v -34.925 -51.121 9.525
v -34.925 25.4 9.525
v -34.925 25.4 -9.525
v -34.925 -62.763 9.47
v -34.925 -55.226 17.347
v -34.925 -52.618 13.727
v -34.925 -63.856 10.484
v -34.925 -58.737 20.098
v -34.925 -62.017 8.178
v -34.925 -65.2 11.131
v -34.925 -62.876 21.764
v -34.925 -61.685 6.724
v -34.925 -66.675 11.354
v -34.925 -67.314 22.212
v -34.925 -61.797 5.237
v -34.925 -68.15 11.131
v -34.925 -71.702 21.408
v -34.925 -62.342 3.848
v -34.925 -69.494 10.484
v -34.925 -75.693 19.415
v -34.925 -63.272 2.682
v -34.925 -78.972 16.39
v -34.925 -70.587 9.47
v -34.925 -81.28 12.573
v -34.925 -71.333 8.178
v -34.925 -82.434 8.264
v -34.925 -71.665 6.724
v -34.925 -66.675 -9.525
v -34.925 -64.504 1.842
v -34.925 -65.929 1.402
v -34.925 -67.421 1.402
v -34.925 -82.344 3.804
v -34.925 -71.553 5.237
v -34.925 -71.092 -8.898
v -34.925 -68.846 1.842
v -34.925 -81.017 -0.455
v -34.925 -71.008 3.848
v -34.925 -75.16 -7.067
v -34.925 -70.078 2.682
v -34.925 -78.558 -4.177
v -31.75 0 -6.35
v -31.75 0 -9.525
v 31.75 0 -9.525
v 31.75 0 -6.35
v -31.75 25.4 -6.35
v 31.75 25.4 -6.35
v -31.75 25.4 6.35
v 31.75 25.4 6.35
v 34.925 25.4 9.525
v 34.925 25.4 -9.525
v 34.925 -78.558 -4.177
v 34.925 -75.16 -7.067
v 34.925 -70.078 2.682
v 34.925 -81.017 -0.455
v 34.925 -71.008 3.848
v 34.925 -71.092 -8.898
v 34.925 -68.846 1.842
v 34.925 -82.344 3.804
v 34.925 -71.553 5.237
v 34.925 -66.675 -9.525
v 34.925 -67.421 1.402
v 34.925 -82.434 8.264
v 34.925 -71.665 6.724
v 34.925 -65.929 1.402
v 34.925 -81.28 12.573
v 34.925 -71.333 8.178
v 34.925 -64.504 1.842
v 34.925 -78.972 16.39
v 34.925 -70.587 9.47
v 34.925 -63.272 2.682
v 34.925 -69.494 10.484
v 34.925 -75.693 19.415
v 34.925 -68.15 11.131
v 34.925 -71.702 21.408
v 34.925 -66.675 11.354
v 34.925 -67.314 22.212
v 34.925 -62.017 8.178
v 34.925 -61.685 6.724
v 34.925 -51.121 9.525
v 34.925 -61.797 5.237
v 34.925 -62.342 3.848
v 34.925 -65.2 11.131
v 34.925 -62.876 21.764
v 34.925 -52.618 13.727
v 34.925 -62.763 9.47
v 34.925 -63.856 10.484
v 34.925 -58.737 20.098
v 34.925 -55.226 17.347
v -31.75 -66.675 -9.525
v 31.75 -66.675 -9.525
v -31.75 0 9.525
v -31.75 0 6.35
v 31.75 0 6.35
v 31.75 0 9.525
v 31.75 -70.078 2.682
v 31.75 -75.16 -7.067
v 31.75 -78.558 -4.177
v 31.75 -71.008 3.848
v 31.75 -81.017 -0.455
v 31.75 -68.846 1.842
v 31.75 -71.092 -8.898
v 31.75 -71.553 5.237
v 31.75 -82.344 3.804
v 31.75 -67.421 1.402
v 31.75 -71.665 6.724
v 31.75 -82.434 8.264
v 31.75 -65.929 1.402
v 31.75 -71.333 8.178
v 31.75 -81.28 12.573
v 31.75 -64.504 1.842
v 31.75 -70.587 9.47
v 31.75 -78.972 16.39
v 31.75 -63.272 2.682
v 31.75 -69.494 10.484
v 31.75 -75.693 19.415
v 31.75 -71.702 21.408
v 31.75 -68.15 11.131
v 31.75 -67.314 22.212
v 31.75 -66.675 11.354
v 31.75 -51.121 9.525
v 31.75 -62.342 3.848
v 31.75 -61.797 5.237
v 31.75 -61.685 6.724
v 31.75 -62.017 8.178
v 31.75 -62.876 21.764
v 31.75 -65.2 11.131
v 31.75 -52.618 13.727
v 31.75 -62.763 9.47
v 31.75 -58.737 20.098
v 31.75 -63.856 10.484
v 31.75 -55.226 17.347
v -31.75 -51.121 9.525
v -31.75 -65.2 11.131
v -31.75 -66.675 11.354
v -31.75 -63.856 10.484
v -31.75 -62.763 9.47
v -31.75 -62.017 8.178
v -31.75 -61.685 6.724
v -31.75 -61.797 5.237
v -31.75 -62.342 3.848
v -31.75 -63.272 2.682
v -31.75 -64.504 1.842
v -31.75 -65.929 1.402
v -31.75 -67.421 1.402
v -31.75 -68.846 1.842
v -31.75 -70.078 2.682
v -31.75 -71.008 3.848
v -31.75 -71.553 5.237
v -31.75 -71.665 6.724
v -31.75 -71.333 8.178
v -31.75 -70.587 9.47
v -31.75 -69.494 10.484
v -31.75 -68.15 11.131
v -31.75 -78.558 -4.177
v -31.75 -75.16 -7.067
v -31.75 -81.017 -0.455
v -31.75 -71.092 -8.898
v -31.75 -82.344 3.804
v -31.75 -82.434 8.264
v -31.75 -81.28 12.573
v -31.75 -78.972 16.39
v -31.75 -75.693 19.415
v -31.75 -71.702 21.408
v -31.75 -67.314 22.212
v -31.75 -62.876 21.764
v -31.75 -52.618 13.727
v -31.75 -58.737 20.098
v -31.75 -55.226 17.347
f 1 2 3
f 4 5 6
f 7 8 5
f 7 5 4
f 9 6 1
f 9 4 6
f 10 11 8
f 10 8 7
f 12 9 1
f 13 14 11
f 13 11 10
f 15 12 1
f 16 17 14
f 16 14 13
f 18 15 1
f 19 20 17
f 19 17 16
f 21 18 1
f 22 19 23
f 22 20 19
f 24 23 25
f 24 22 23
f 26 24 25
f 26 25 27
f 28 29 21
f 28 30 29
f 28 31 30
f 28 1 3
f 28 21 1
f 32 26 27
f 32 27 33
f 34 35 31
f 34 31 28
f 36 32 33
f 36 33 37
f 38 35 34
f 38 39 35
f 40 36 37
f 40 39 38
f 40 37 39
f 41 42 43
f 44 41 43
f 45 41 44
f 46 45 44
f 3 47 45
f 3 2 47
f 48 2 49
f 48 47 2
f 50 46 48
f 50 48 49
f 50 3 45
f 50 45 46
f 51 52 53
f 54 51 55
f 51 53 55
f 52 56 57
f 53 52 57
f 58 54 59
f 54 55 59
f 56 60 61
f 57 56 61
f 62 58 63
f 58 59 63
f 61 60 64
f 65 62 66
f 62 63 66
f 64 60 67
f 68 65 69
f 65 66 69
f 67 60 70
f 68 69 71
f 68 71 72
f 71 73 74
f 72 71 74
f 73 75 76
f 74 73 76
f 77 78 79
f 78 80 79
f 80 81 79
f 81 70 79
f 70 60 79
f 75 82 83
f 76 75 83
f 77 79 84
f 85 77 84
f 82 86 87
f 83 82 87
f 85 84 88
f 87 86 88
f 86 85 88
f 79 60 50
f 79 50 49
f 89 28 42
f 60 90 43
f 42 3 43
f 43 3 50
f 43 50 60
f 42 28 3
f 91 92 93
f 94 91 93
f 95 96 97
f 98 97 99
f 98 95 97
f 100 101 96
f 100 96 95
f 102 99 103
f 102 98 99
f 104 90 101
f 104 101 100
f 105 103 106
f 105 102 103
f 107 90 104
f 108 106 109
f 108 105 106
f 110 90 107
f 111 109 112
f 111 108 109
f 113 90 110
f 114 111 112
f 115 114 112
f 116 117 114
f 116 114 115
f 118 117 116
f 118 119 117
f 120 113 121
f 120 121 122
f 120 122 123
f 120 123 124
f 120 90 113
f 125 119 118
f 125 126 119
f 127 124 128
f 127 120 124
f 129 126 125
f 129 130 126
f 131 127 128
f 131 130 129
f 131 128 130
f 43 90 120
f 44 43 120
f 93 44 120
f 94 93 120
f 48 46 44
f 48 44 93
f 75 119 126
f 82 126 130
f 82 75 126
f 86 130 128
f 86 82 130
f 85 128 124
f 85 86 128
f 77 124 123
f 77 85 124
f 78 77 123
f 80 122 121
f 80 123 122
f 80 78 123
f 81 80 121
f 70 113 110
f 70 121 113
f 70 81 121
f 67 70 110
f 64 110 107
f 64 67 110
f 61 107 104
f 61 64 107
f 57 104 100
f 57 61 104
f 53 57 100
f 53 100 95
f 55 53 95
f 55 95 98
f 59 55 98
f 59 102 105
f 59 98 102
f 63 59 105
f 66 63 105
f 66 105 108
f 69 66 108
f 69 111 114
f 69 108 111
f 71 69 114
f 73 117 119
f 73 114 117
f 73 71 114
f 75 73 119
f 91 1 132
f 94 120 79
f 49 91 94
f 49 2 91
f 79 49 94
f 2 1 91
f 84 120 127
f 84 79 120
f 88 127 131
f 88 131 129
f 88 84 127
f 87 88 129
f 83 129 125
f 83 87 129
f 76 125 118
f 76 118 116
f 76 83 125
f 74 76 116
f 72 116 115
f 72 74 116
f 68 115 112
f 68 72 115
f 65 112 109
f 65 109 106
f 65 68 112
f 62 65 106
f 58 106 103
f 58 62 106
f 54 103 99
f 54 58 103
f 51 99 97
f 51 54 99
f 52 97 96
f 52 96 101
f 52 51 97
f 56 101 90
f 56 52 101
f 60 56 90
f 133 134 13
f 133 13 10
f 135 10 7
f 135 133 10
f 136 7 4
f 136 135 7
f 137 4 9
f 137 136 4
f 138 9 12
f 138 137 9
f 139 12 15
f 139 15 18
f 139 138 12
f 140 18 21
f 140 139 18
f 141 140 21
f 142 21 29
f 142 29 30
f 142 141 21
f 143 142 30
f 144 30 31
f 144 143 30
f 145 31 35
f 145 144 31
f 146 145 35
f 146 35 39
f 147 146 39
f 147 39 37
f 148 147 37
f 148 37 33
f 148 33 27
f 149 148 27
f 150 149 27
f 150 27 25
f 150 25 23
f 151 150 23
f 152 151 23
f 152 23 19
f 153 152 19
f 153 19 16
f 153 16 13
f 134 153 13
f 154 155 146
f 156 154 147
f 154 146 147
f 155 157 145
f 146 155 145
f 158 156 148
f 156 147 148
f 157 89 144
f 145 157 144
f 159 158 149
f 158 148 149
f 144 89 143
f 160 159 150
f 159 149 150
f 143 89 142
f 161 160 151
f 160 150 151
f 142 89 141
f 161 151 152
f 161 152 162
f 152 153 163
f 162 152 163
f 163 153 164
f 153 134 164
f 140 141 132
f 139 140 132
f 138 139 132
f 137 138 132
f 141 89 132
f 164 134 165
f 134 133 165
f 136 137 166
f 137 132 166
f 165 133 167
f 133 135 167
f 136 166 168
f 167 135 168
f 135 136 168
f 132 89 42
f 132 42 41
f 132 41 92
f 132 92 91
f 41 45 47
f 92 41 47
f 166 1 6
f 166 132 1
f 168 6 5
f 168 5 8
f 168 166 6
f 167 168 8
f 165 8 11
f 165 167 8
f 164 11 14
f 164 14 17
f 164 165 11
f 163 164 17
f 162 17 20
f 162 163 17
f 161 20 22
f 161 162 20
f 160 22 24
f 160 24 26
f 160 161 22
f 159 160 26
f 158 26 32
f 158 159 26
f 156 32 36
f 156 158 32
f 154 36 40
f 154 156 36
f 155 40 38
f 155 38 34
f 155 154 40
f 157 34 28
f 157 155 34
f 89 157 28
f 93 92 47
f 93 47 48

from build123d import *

# Parameters (mm, degrees)
PROBEPROFILE_W      = 69.85
PROBEPROFILE_H      = 19.05
PROBEPROFILE_W_2    = 63.5
PROBEPROFILE_H_2    = 12.7
EXTRUDE_THIN1_DEPTH = 25.4
SKETCH2_R           = 15.875
BOSS_EXTRUDE1_DEPTH = 34.925
SKETCH2_2_R         = 15.875
CUT_EXTRUDE1_DEPTH  = 31.75
SKETCH3_W           = 3.175
SKETCH3_H           = 19.05
BOSS_EXTRUDE2_DEPTH = 66.675
CUT_EXTRUDE2_START  = -69.85
SKETCH4_R           = 5.0038
CUT_EXTRUDE2_DEPTH  = 69.85


with BuildPart() as part:
    # ProbeProfile → Extrude-Thin1 (new body)
    with BuildSketch(Plane(origin=(0, 0, 0), x_dir=(1, 0, 0), z_dir=(0, 1, 0))):
        Rectangle(PROBEPROFILE_W, PROBEPROFILE_H)
        Rectangle(PROBEPROFILE_W_2, PROBEPROFILE_H_2, mode=Mode.SUBTRACT)
    extrude(amount=EXTRUDE_THIN1_DEPTH)



with BuildPart() as body_2:
    # Sketch2 → Boss-Extrude1 (new body, symmetric)
    with BuildSketch(Plane(origin=(0, 0, 0), x_dir=(0, 0, -1), z_dir=(1, 0, 0))):
        with Locations((-6.35, -66.675)):
            Circle(SKETCH2_R)
    extrude(amount=BOSS_EXTRUDE1_DEPTH, both=True)

    # Sketch2<2> → Cut-Extrude1 (cut, symmetric)
    with BuildSketch(Plane(origin=(0, 0, 0), x_dir=(0, 0, -1), z_dir=(1, 0, 0))):
        with Locations((-6.35, -66.675)):
            Circle(SKETCH2_2_R)
    extrude(amount=CUT_EXTRUDE1_DEPTH, both=True, mode=Mode.SUBTRACT)


with BuildPart() as part_1:
    add(part.part)

    add(body_2.part)  # Boss-Extrude2 merges body 2
    # Sketch3 → Boss-Extrude2 (add)
    with BuildSketch(Plane.XZ):
        with Locations((33.3375, 0)):
            Rectangle(SKETCH3_W, SKETCH3_H)
        with Locations((-33.3375, 0)):
            Rectangle(SKETCH3_W, SKETCH3_H)
    extrude(amount=BOSS_EXTRUDE2_DEPTH)

    # Sketch4 → Cut-Extrude2 (cut)
    with BuildSketch(Plane.ZY.offset(34.925).offset(CUT_EXTRUDE2_START)):
        with Locations((6.35, -66.675)):
            Circle(SKETCH4_R)
    extrude(amount=CUT_EXTRUDE2_DEPTH, mode=Mode.SUBTRACT)


solid = part_1.part
